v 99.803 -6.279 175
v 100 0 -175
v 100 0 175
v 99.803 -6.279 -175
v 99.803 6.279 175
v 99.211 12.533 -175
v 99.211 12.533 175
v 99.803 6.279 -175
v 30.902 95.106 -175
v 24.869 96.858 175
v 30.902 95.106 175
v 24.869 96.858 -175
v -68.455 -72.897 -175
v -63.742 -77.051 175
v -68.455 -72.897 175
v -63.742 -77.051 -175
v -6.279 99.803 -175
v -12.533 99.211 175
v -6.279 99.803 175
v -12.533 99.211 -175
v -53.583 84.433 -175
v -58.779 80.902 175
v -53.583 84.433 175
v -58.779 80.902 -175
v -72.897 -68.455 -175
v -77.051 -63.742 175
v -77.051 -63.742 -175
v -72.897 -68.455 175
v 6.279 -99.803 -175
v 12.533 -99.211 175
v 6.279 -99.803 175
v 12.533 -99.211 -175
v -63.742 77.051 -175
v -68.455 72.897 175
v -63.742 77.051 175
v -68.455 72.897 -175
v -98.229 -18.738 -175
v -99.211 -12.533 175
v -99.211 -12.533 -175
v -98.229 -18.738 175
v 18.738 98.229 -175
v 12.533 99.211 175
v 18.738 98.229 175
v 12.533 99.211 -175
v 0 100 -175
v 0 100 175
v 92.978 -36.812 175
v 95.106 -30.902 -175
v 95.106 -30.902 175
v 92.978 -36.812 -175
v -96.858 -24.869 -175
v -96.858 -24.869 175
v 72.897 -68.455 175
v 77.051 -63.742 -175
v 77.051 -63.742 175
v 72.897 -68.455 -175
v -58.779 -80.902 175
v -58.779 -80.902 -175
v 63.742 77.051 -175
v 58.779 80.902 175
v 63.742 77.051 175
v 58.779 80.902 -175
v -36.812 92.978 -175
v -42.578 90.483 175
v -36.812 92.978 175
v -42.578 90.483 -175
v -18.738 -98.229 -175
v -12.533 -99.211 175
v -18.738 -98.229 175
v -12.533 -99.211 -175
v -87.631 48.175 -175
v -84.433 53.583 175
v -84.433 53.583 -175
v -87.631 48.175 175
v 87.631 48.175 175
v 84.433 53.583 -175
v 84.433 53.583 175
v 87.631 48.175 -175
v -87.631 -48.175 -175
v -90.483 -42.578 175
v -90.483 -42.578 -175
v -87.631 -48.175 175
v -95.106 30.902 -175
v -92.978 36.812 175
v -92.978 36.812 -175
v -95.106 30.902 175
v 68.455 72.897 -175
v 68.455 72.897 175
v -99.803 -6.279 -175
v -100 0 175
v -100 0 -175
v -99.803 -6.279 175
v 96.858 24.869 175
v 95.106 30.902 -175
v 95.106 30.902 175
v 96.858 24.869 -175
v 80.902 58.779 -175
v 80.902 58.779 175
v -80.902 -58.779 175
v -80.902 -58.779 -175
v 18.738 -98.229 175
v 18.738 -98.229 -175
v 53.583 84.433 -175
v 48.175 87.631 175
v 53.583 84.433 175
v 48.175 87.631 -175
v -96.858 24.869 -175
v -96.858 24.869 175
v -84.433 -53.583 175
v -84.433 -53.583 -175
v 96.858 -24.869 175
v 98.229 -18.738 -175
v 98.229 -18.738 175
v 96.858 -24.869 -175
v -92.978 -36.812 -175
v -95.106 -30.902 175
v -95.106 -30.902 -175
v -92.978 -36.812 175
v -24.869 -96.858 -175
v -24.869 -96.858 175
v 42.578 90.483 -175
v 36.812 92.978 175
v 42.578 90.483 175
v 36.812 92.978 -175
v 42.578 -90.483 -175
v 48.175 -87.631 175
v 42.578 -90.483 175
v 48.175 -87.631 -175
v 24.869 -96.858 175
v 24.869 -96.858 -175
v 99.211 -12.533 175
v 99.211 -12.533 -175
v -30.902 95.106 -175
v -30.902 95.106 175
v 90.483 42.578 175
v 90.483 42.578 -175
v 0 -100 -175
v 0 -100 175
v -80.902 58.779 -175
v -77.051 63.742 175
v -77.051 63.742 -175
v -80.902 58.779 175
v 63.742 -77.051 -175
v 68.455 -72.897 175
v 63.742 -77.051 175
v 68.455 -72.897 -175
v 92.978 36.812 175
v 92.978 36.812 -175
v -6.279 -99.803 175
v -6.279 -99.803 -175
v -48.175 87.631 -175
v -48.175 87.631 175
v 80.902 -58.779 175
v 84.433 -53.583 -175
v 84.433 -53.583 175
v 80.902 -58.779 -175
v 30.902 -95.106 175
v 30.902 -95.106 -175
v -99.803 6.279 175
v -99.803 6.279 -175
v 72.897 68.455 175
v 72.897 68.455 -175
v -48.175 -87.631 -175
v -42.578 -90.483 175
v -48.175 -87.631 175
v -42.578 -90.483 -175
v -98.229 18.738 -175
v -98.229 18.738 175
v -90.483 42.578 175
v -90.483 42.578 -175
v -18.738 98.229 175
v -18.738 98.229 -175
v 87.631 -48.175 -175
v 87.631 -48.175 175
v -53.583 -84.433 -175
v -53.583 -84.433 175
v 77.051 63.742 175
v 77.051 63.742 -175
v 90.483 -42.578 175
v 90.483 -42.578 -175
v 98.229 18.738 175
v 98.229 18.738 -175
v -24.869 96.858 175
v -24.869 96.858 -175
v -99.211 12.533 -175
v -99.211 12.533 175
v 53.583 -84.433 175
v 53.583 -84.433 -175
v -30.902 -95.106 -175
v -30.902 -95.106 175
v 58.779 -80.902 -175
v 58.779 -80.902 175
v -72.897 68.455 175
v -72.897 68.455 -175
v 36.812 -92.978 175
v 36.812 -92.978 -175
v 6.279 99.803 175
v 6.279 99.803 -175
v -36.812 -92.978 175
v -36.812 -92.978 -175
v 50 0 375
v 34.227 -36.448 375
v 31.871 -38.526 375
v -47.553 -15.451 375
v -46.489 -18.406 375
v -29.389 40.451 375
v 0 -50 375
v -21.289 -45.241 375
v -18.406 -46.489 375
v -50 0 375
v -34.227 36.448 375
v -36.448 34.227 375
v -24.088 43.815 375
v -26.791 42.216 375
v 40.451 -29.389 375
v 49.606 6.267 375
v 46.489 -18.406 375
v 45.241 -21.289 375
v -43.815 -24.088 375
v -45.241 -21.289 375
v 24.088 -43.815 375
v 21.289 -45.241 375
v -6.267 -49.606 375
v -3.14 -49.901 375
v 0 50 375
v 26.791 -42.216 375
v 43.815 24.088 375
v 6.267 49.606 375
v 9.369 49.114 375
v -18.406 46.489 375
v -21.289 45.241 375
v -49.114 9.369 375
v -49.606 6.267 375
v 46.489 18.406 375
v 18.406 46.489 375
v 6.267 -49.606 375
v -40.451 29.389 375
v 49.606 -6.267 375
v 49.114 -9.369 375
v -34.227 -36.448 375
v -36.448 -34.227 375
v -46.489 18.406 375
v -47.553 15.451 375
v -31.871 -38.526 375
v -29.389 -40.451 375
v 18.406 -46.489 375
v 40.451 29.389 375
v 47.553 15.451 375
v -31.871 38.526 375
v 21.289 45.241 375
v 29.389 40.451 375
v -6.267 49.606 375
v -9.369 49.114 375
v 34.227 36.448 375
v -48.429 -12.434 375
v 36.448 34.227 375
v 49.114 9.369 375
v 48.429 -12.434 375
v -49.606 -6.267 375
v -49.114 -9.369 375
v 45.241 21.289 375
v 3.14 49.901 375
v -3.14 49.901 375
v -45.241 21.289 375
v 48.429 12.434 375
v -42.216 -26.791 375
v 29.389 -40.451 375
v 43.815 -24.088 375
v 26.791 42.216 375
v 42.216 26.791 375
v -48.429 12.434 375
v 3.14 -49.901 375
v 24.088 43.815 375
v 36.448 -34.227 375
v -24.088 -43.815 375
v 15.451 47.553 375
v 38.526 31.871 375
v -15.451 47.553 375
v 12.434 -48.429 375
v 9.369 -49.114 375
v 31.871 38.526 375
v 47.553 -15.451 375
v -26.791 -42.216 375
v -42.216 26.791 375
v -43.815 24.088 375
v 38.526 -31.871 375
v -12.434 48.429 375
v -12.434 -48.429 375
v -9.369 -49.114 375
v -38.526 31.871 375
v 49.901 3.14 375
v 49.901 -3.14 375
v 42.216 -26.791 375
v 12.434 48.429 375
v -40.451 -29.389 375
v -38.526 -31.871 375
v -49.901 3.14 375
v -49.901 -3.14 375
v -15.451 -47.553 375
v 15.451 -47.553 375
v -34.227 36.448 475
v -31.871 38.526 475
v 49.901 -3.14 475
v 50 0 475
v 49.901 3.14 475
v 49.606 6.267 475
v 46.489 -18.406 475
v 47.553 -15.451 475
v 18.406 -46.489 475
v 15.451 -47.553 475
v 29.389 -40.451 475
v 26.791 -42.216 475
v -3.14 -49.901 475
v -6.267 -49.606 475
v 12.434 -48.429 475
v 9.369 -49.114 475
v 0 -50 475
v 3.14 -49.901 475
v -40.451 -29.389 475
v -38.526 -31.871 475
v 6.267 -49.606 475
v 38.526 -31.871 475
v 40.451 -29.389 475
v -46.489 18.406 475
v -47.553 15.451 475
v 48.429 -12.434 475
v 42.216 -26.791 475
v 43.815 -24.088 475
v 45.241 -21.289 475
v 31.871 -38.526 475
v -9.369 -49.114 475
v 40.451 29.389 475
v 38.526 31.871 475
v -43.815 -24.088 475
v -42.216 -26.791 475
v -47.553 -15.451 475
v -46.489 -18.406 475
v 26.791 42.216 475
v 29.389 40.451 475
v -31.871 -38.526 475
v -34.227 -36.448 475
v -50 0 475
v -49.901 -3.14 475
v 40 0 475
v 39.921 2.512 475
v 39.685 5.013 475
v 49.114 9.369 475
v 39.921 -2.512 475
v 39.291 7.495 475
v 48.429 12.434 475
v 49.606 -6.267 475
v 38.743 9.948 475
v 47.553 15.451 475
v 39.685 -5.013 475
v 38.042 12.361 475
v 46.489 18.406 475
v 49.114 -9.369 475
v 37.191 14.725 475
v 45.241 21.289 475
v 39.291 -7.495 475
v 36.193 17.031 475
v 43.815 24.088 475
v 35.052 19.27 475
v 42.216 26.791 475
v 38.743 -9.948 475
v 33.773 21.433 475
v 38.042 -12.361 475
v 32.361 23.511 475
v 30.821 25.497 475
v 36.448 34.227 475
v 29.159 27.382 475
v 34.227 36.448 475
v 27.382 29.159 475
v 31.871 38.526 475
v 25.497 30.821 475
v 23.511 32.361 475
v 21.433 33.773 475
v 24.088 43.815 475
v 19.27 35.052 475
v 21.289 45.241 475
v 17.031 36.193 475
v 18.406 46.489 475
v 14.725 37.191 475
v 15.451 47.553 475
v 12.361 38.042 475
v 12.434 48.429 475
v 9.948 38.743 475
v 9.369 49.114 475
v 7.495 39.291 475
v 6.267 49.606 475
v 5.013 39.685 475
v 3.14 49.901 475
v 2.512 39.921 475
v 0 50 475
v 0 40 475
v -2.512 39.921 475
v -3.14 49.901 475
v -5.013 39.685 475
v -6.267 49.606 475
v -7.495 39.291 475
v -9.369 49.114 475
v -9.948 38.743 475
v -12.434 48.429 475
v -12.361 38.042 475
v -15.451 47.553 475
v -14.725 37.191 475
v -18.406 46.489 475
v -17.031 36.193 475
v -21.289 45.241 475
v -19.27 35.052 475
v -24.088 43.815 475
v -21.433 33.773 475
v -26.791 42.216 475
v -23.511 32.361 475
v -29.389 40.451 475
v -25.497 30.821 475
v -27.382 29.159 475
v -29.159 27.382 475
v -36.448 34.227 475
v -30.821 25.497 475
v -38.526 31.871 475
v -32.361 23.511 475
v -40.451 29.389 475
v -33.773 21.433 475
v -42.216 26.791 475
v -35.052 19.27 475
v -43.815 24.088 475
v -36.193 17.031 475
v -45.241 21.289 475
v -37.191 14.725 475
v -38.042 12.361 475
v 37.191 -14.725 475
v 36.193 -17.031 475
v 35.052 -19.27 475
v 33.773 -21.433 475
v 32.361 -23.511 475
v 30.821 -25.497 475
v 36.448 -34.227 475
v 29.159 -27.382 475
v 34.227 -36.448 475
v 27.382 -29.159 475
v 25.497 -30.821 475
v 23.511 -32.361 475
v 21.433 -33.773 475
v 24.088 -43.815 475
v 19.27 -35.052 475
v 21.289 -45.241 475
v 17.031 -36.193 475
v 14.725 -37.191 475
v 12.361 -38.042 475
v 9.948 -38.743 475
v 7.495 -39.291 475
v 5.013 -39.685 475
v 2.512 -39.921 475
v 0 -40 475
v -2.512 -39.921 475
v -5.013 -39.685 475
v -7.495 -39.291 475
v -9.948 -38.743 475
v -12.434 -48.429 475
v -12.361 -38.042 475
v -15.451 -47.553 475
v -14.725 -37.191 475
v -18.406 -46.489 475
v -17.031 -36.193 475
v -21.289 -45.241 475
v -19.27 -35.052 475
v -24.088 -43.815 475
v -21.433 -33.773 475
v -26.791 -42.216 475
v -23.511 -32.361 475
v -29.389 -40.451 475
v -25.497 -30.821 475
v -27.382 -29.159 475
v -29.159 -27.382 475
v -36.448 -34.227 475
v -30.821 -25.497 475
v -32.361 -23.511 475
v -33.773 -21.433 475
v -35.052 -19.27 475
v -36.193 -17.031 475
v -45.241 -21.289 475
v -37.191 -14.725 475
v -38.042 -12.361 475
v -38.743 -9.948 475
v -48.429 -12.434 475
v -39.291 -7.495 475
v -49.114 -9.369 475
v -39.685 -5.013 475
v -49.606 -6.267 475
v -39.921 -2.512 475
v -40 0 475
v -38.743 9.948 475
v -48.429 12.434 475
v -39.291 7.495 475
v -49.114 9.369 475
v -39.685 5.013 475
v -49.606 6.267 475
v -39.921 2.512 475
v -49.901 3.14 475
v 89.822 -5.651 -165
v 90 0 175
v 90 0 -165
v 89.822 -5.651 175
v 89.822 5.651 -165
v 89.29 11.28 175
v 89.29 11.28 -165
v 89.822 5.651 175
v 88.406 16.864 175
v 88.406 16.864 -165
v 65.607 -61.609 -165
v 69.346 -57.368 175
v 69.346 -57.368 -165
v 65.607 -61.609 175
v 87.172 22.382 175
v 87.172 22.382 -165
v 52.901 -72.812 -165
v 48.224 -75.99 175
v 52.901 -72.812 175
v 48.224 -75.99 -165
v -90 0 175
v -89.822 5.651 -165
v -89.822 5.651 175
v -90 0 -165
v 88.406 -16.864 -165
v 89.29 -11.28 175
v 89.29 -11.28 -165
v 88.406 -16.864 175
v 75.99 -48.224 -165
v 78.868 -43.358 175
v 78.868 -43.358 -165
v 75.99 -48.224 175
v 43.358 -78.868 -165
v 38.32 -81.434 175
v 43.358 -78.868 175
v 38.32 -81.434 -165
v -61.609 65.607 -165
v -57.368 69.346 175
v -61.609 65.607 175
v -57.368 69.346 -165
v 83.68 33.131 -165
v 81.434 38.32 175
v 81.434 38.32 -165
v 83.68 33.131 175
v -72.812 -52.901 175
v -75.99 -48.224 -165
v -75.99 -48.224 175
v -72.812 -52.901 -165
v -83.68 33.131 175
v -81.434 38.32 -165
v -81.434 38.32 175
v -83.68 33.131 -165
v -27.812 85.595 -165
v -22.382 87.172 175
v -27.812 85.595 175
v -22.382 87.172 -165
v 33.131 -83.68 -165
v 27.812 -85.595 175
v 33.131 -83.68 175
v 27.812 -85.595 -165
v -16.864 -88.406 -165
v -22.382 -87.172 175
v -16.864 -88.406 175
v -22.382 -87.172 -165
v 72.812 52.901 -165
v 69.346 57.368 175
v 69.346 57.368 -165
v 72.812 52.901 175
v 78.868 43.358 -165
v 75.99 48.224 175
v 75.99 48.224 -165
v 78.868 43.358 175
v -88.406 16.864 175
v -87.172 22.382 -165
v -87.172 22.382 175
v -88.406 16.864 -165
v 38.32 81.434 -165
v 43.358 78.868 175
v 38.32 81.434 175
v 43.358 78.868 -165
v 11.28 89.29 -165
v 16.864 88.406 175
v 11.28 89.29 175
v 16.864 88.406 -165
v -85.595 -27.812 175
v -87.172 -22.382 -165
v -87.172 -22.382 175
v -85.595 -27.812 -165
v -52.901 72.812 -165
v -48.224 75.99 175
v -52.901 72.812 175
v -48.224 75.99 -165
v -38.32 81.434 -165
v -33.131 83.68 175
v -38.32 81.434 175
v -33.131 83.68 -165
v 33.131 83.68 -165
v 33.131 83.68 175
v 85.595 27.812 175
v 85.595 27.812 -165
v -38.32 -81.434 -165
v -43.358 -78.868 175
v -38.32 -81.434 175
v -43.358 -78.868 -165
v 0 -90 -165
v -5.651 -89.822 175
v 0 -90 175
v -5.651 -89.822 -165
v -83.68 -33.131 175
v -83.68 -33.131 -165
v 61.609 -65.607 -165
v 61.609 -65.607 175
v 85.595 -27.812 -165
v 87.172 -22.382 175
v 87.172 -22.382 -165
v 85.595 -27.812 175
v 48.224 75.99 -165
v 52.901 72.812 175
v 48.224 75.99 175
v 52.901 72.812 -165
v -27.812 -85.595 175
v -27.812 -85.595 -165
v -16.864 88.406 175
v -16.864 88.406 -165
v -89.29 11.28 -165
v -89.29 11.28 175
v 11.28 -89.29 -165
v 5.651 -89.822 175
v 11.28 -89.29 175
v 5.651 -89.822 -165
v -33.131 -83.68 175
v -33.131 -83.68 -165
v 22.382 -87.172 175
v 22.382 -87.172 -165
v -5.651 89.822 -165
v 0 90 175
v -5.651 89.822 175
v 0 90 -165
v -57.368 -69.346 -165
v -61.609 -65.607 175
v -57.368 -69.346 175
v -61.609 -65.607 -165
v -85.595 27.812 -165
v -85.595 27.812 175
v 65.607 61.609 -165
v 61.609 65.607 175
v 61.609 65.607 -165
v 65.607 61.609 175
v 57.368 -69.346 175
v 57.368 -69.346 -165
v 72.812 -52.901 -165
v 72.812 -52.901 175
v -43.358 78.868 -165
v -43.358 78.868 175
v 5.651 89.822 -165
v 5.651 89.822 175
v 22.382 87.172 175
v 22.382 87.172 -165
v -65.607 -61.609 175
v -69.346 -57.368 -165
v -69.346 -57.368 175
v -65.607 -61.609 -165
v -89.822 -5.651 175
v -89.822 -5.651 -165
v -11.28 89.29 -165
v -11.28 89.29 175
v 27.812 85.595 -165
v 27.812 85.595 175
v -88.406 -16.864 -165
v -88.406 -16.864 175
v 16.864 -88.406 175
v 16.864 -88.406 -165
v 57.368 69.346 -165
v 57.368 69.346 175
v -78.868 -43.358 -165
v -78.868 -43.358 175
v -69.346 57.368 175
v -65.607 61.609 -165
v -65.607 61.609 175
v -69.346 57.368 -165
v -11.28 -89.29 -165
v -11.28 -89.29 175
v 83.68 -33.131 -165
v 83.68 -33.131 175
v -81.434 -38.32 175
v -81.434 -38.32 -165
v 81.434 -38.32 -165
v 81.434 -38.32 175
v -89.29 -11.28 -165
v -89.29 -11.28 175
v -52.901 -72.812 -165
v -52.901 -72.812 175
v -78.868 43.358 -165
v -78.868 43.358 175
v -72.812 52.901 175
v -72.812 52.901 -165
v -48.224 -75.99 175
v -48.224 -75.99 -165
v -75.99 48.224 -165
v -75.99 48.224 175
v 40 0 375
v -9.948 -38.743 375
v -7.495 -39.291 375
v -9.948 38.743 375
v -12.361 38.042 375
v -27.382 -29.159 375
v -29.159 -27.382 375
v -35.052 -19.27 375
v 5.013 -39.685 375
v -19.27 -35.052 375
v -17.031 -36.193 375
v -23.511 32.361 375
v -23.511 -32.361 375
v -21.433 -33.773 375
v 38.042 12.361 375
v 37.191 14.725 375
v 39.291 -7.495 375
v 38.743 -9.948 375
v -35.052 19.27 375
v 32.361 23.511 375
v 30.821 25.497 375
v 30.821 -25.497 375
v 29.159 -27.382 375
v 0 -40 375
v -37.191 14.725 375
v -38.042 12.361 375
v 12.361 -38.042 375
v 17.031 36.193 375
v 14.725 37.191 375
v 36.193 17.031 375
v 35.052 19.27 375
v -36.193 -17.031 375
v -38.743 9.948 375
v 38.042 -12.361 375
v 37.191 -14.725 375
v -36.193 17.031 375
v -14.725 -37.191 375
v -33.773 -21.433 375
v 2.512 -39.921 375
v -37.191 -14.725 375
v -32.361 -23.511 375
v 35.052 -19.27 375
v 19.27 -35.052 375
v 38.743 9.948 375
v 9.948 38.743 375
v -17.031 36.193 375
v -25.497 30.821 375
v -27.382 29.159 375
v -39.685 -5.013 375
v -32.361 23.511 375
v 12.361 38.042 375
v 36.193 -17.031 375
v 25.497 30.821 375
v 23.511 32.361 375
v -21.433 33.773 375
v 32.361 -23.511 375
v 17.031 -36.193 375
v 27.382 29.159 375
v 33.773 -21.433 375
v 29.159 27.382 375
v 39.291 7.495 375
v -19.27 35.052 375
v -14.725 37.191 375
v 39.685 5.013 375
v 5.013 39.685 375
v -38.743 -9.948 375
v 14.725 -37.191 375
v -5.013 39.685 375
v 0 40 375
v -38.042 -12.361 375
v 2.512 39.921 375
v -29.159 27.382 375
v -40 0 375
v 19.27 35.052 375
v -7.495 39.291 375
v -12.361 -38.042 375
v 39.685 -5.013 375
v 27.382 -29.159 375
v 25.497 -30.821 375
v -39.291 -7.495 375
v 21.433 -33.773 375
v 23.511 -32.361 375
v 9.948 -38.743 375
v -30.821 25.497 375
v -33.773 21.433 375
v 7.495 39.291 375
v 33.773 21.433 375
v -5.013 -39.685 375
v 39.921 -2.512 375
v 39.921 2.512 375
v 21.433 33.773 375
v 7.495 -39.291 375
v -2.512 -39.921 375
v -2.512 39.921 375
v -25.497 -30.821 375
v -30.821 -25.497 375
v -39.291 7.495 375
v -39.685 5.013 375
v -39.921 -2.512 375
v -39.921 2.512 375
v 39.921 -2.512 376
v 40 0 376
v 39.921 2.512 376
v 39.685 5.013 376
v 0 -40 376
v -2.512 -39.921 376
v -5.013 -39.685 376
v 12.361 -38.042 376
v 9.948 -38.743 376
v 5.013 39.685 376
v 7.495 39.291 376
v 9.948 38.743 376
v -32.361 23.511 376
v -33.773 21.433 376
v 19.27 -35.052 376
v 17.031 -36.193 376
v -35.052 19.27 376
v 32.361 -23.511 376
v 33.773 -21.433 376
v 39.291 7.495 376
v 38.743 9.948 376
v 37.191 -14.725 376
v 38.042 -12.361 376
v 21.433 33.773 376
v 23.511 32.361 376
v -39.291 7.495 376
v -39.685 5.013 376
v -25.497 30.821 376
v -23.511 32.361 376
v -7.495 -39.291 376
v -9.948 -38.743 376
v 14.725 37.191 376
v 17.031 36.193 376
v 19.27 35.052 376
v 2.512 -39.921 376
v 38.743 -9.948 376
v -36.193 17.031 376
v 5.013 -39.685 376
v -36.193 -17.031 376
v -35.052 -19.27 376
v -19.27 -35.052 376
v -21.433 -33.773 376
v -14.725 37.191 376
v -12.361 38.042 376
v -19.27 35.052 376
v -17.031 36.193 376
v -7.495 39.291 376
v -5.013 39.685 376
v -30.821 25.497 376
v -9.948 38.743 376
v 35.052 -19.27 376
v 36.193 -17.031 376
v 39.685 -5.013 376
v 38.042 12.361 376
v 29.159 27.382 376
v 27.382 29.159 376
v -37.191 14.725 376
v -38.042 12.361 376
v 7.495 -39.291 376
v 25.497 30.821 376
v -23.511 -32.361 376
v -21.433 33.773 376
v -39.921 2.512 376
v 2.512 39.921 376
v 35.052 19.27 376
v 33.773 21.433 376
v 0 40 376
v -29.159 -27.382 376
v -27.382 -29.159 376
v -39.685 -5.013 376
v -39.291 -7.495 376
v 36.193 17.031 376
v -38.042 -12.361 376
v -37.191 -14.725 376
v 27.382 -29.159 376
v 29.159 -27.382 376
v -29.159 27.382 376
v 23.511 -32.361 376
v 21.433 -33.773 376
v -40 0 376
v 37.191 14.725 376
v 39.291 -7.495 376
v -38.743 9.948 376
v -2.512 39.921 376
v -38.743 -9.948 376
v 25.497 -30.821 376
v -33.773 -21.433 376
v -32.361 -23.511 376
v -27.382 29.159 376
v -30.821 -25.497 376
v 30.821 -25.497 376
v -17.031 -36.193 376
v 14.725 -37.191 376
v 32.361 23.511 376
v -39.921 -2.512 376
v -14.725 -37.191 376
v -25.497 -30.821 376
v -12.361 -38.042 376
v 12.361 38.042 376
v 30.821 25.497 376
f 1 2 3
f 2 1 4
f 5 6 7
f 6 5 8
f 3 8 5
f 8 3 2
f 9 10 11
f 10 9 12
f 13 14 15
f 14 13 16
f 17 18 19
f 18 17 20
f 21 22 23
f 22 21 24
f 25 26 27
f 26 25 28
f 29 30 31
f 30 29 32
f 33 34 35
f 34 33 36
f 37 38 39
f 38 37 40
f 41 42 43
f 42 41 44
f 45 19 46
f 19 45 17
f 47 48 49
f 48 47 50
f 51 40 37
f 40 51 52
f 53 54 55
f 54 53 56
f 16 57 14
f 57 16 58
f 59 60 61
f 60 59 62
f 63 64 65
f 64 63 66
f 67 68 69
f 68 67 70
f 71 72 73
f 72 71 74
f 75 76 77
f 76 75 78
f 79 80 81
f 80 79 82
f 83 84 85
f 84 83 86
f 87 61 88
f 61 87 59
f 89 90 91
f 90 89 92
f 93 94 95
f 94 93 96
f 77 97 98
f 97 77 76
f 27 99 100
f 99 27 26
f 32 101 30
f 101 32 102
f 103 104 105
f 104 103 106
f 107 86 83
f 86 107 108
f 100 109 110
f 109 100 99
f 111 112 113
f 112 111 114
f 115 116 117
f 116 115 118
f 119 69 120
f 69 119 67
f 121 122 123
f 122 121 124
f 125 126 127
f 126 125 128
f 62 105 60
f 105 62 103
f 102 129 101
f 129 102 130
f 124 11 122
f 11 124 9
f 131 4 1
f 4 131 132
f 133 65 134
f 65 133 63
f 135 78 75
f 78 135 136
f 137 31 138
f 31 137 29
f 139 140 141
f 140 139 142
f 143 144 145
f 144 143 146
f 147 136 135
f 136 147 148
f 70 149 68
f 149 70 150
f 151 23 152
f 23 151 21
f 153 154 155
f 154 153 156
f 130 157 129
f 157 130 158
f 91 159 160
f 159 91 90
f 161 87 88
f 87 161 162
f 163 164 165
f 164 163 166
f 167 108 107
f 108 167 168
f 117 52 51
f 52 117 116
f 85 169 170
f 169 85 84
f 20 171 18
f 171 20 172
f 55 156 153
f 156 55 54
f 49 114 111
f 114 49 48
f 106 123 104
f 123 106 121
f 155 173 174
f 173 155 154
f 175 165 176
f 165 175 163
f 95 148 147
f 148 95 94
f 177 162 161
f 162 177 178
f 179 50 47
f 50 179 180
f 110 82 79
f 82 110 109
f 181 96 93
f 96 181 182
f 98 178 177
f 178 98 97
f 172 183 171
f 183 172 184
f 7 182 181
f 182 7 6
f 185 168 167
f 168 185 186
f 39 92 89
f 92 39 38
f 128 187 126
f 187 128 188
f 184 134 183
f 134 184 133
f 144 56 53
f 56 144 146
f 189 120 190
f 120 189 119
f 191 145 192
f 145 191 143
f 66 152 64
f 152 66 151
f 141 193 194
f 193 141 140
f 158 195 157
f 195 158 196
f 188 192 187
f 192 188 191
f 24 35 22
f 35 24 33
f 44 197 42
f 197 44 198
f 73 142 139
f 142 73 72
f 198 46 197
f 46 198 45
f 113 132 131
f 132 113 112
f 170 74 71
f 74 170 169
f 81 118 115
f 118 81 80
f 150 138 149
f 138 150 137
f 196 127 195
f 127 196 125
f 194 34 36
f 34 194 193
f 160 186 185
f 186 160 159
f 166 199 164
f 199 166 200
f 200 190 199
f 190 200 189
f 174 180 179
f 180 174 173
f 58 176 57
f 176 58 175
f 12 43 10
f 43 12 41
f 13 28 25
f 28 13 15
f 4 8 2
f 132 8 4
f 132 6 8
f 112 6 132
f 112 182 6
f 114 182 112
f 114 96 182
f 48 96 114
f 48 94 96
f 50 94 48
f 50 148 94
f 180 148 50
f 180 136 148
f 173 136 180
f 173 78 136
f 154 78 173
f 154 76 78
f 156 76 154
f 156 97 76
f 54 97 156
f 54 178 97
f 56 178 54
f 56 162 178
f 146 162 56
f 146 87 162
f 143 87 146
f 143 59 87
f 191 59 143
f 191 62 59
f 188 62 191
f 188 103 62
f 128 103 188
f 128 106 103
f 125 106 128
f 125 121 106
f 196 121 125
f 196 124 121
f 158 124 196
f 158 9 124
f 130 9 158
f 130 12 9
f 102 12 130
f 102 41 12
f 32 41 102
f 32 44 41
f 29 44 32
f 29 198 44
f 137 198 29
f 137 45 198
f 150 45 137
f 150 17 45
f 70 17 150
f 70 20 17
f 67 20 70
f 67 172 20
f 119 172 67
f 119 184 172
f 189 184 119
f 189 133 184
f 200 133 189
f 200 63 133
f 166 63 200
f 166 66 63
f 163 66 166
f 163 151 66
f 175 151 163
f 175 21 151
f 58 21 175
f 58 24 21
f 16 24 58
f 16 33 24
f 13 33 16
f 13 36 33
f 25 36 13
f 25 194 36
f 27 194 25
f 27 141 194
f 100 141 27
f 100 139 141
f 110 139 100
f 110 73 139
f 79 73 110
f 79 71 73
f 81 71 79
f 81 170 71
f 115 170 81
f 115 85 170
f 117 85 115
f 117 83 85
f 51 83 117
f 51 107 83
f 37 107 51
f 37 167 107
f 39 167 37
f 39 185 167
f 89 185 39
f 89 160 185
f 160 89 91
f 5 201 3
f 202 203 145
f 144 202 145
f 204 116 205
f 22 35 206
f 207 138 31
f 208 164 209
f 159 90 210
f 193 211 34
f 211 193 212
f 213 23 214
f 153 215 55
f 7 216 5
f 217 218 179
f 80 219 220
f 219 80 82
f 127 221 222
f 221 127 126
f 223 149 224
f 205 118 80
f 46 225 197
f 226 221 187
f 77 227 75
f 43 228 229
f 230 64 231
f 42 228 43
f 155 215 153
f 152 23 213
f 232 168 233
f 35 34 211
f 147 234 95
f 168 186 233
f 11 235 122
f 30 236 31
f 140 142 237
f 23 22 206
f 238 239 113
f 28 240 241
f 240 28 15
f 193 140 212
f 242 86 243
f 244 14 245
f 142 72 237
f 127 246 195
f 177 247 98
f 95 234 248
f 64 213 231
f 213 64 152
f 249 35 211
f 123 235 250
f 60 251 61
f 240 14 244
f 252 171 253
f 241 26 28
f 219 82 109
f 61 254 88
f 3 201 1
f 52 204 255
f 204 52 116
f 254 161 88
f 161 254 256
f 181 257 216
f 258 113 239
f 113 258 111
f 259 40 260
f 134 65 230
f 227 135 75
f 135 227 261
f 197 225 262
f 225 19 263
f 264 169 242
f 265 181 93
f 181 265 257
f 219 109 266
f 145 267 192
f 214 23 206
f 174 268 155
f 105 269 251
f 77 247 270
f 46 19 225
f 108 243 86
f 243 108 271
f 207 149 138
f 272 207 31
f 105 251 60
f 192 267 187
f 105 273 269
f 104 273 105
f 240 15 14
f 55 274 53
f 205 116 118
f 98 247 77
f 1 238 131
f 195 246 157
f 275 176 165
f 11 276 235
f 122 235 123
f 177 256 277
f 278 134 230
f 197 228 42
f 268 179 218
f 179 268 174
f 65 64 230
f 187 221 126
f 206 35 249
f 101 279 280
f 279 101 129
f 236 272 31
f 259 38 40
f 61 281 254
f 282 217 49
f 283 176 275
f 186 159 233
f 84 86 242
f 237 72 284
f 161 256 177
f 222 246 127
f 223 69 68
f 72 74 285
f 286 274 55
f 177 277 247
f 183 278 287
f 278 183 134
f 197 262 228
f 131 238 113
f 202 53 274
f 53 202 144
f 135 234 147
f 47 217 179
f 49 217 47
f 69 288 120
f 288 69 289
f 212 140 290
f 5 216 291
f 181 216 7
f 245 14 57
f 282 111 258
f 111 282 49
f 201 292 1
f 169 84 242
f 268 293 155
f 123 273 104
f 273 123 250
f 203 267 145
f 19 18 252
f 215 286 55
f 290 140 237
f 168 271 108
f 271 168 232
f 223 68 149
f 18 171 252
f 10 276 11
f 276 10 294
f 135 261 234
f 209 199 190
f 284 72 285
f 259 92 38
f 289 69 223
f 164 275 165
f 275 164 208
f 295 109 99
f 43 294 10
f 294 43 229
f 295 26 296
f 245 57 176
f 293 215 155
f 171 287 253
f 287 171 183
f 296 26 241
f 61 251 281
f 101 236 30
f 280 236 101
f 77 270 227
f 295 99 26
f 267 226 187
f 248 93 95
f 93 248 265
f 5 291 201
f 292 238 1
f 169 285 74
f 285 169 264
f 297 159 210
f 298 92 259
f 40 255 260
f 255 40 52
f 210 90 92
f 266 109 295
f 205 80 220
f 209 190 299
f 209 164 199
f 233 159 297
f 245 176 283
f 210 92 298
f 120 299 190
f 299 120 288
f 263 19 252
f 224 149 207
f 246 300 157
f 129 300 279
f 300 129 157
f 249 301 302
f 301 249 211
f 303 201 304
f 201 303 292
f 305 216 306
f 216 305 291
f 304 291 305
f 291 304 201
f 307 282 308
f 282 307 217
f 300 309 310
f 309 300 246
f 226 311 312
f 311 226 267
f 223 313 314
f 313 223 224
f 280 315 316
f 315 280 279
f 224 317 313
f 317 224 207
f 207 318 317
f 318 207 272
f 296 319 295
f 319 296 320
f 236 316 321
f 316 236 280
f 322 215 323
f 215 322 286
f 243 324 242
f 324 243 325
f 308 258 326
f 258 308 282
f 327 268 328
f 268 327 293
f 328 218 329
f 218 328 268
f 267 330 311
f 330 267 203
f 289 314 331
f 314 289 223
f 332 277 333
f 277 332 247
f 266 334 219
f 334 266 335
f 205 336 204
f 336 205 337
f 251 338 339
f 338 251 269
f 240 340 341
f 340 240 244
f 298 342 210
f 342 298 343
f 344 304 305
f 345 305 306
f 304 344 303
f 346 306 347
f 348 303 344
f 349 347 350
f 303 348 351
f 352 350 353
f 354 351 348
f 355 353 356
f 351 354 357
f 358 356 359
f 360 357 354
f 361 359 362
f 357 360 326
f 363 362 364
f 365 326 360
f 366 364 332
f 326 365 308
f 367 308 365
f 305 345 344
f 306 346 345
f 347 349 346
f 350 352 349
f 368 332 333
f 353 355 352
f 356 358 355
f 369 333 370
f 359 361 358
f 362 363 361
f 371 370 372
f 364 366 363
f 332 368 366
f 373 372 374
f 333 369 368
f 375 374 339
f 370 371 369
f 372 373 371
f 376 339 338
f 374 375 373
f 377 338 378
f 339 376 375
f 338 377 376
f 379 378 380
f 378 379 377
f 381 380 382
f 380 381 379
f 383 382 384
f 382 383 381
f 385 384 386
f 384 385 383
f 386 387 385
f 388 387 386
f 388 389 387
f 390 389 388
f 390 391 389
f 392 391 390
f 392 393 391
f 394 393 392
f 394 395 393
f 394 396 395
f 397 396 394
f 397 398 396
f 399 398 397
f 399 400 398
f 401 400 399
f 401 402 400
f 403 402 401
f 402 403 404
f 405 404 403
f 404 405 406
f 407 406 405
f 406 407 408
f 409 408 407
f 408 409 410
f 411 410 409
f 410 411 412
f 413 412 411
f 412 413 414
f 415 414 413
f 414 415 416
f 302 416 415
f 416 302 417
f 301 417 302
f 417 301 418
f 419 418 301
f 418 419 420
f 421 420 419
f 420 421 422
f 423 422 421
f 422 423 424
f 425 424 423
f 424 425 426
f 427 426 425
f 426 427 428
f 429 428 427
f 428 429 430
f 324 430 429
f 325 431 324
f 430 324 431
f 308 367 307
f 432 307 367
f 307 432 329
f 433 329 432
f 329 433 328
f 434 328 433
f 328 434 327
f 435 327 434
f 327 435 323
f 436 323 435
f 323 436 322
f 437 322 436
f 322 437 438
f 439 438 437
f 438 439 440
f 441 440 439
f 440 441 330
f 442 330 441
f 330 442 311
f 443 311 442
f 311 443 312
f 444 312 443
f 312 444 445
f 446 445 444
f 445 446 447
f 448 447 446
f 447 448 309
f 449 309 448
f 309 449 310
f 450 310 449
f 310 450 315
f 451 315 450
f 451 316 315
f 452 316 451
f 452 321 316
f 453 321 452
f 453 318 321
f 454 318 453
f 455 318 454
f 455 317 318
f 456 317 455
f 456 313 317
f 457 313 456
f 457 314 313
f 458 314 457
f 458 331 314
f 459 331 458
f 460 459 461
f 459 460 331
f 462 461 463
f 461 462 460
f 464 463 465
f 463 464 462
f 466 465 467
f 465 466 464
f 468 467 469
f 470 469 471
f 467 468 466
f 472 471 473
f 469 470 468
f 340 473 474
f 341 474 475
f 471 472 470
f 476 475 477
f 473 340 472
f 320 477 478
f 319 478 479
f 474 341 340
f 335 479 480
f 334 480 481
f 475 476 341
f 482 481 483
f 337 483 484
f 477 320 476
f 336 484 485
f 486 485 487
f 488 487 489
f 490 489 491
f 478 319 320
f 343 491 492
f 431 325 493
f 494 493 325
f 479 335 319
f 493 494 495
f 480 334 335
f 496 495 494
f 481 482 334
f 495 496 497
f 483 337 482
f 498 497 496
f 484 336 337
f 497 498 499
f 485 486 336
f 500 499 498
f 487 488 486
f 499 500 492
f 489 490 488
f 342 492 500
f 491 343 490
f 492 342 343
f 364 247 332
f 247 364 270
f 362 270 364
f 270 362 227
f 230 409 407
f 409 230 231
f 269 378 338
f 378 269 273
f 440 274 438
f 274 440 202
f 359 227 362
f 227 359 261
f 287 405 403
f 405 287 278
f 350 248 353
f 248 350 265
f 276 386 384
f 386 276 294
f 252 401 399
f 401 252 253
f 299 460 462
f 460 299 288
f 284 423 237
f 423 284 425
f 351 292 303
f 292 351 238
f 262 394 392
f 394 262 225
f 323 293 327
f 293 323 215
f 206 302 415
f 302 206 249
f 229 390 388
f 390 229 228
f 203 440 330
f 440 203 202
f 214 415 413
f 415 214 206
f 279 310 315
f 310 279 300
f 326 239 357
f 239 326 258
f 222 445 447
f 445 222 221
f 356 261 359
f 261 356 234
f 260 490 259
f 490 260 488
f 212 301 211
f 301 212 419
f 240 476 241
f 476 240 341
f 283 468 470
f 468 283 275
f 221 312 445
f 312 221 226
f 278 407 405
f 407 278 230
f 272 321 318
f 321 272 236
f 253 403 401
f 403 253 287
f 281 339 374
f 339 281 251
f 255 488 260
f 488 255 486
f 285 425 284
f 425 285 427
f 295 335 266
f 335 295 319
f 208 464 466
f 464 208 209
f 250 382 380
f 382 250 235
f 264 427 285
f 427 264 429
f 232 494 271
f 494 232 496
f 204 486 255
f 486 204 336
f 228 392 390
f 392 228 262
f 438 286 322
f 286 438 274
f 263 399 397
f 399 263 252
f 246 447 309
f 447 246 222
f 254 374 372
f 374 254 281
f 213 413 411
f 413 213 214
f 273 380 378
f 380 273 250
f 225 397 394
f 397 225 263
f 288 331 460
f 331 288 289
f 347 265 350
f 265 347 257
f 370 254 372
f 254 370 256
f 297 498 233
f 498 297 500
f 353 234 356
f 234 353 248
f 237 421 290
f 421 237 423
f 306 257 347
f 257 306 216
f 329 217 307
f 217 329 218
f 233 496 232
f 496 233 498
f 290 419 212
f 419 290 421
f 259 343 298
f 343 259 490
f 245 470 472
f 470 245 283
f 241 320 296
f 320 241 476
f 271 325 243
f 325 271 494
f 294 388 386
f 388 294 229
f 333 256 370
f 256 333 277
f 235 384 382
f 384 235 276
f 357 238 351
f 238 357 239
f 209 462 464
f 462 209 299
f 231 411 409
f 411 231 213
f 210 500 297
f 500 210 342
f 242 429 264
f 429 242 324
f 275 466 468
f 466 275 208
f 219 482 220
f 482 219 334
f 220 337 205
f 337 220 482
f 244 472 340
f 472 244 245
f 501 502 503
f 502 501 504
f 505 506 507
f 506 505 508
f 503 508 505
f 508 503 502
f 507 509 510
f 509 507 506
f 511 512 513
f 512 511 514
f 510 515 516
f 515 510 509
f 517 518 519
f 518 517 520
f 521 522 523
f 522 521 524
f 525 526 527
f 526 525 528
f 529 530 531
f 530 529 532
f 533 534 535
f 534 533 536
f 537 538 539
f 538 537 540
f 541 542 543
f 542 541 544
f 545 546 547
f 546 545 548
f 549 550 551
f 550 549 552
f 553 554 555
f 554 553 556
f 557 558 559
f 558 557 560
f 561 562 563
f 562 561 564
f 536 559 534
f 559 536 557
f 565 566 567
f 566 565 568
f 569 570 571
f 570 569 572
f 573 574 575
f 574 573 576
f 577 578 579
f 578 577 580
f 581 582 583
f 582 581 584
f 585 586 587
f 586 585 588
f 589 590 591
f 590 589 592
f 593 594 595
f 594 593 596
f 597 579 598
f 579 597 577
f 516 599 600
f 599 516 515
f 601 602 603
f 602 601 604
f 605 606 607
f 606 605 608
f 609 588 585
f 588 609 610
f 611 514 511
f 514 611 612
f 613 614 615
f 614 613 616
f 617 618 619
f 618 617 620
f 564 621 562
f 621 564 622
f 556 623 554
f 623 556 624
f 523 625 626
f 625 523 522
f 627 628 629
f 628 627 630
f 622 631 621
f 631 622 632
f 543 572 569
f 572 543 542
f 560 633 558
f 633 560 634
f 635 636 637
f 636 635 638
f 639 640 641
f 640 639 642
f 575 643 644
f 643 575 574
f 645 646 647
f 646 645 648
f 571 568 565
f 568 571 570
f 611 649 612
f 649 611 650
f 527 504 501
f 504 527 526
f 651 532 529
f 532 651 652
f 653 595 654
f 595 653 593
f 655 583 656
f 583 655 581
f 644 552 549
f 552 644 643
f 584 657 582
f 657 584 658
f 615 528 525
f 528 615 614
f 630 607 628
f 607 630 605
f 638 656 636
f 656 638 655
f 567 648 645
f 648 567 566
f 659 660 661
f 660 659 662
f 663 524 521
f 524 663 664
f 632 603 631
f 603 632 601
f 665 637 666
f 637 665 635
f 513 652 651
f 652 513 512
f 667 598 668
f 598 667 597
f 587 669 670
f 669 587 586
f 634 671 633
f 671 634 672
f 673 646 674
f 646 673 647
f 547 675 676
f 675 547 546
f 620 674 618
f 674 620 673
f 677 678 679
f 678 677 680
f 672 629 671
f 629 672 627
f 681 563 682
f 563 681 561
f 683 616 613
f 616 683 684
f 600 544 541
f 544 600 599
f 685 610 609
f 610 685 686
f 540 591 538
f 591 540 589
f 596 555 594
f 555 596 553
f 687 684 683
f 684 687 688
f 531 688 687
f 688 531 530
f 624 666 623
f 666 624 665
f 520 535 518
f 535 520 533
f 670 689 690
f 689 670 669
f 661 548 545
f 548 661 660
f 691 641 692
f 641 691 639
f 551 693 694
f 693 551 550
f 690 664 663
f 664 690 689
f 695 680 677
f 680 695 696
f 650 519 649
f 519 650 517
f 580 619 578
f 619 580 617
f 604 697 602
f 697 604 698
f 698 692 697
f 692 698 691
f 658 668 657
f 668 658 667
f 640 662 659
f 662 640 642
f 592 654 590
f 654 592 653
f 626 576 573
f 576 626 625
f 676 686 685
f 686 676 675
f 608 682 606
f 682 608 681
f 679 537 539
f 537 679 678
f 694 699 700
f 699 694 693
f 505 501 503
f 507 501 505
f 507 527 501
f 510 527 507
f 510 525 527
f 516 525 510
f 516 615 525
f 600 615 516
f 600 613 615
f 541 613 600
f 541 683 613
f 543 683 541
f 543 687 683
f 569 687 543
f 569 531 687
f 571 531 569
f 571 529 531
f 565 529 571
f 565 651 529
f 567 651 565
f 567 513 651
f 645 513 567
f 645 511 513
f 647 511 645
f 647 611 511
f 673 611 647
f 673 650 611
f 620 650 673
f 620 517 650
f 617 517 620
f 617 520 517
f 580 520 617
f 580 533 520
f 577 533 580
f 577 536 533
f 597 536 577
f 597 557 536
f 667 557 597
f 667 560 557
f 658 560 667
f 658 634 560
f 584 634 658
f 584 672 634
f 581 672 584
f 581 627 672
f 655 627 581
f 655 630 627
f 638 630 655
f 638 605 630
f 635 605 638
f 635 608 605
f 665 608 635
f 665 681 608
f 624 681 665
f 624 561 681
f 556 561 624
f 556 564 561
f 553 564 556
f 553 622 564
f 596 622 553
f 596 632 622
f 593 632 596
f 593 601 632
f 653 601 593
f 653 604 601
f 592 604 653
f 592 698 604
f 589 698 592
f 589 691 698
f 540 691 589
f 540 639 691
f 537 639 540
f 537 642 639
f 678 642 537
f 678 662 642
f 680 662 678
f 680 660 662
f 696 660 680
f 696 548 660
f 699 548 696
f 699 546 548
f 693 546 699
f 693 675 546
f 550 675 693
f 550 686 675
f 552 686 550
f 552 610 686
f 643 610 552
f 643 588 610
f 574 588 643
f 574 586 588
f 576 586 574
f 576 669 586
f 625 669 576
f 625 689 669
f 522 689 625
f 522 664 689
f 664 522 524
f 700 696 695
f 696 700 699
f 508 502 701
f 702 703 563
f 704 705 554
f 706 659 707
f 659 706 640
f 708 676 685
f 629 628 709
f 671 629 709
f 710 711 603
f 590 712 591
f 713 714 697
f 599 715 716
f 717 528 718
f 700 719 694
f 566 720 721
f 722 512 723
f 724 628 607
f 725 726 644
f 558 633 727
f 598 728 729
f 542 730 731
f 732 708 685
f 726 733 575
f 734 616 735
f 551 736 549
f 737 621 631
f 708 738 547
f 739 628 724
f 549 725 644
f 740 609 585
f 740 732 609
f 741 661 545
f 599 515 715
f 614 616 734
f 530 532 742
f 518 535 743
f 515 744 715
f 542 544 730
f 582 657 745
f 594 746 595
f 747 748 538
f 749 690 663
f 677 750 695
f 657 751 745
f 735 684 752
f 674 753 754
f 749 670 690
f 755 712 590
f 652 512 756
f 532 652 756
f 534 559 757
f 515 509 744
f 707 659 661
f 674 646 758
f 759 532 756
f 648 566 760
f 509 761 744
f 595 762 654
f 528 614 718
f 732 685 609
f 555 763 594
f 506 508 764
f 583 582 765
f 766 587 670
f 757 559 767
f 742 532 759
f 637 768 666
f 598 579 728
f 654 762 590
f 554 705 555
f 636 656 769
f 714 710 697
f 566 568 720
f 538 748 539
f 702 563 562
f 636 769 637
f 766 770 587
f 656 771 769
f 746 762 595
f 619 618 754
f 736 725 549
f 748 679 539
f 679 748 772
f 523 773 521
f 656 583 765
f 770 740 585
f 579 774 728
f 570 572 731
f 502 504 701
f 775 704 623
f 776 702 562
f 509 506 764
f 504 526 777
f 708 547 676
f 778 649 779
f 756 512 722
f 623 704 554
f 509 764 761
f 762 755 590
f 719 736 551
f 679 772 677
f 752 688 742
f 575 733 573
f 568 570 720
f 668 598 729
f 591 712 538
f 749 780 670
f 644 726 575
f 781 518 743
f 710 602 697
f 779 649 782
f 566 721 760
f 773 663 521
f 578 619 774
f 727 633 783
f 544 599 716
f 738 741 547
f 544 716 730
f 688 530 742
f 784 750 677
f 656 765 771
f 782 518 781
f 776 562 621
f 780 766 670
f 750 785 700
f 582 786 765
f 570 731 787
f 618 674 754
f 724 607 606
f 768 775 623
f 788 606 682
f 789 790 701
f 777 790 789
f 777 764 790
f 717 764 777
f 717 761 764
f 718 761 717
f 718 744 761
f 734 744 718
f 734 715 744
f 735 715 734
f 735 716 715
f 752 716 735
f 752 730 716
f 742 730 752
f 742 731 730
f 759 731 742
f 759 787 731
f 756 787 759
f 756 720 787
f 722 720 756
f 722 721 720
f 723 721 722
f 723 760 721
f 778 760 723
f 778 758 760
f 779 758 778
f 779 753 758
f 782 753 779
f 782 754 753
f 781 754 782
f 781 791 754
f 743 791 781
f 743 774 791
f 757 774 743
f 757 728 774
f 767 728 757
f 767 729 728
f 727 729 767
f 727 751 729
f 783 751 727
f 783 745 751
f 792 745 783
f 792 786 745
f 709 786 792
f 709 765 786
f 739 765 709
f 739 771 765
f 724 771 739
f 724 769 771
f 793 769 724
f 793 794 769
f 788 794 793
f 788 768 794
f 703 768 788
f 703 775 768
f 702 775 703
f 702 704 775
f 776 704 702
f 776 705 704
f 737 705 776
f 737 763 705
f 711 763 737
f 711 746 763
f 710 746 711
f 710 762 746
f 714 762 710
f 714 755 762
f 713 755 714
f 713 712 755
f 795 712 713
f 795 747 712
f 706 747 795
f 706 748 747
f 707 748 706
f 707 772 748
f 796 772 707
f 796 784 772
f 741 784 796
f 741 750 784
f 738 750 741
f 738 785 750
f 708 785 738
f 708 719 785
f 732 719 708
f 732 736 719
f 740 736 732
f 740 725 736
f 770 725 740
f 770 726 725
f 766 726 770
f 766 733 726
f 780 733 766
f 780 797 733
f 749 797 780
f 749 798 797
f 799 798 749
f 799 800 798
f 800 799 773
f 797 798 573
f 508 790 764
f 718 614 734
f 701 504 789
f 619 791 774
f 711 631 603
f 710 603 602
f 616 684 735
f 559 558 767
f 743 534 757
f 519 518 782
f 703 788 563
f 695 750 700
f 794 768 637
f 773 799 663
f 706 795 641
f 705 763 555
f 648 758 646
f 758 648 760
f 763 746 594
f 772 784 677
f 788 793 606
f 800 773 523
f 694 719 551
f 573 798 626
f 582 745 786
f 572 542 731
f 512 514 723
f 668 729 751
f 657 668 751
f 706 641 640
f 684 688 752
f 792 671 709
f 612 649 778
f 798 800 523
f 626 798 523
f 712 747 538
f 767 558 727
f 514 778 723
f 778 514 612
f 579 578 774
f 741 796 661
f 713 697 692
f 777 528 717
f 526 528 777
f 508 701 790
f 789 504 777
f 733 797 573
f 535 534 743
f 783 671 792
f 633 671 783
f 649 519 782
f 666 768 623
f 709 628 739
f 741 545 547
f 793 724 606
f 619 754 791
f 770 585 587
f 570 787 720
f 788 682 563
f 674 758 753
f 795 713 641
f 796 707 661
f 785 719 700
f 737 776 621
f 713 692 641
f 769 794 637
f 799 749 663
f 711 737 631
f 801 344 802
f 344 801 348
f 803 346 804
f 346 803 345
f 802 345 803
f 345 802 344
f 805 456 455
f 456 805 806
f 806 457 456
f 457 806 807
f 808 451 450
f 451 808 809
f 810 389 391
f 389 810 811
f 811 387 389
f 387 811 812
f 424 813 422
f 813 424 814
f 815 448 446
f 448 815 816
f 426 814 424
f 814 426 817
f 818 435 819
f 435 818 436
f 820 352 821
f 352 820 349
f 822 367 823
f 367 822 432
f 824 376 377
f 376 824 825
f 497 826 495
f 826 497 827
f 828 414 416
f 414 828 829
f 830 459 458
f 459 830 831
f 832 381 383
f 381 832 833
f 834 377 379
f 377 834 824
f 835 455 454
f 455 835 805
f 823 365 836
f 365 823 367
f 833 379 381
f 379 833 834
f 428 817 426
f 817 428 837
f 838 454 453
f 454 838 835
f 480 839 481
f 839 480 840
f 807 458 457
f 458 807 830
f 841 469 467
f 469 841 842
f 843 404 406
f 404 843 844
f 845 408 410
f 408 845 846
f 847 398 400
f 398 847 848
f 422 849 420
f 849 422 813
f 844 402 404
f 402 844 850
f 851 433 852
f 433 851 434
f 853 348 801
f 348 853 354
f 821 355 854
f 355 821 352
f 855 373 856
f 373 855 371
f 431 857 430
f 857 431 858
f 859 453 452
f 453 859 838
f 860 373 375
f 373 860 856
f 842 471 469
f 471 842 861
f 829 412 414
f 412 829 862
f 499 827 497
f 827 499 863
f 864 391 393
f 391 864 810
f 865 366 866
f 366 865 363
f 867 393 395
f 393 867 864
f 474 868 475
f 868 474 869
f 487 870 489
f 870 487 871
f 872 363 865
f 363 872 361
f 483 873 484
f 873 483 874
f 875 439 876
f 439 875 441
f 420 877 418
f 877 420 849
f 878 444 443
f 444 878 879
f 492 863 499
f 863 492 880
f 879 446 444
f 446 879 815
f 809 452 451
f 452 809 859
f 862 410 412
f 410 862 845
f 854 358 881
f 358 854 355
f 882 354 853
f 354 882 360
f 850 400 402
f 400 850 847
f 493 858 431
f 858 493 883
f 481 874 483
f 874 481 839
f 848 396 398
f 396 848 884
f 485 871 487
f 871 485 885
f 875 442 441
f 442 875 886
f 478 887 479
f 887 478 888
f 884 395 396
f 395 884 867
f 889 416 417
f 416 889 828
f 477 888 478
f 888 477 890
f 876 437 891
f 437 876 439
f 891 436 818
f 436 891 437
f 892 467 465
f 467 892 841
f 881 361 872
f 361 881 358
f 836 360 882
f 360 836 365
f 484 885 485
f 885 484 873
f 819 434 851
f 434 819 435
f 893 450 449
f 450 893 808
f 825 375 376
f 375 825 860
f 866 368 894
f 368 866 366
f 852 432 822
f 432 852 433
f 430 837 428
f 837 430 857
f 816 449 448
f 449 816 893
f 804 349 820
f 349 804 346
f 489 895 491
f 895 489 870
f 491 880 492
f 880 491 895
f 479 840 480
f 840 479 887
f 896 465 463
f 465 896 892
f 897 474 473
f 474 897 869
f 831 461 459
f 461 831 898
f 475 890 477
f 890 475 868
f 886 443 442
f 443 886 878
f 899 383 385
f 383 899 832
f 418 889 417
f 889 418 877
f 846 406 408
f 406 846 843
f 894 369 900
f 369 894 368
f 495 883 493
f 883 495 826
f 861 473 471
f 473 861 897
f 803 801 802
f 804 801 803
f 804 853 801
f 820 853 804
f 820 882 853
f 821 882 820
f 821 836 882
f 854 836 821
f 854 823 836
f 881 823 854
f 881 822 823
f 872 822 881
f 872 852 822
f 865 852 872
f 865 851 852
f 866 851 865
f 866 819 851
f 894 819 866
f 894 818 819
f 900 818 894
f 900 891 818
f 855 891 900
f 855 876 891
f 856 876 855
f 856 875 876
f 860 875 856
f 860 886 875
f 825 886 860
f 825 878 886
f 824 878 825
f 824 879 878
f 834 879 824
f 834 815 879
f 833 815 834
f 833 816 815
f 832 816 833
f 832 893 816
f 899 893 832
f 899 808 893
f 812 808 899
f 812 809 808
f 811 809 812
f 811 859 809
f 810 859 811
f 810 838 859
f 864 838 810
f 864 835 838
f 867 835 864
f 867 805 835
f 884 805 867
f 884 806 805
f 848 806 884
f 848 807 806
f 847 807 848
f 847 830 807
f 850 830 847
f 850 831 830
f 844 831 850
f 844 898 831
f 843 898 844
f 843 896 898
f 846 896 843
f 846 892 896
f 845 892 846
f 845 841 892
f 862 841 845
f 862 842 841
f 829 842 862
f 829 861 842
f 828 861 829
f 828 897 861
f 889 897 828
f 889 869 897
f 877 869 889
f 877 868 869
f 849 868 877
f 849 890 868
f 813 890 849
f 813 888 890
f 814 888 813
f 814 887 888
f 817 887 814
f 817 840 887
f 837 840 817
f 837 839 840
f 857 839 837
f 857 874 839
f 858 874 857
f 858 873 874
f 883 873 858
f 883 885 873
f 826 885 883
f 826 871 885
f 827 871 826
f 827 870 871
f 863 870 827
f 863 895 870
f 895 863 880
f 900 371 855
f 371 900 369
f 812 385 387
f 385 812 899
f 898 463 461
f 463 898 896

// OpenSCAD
difference() {
	union() {
		cylinder(r=100,h=350,center=true,$fn=100);
		translate([0,0,175]) cylinder(r1=100,r2=50,h=200,$fn=100);
		translate([0,0,375]) cylinder(r=50,h=100,$fn=100);
	}
	union() {
		translate([0,0,5]) cylinder(r=90,h=340,center=true,$fn=100);
		translate([0,0,175]) cylinder(r1=90,r2=40,h=200,$fn=100);
		translate([0,0,376]) cylinder(r=40,h=102,$fn=100);
	}
}
